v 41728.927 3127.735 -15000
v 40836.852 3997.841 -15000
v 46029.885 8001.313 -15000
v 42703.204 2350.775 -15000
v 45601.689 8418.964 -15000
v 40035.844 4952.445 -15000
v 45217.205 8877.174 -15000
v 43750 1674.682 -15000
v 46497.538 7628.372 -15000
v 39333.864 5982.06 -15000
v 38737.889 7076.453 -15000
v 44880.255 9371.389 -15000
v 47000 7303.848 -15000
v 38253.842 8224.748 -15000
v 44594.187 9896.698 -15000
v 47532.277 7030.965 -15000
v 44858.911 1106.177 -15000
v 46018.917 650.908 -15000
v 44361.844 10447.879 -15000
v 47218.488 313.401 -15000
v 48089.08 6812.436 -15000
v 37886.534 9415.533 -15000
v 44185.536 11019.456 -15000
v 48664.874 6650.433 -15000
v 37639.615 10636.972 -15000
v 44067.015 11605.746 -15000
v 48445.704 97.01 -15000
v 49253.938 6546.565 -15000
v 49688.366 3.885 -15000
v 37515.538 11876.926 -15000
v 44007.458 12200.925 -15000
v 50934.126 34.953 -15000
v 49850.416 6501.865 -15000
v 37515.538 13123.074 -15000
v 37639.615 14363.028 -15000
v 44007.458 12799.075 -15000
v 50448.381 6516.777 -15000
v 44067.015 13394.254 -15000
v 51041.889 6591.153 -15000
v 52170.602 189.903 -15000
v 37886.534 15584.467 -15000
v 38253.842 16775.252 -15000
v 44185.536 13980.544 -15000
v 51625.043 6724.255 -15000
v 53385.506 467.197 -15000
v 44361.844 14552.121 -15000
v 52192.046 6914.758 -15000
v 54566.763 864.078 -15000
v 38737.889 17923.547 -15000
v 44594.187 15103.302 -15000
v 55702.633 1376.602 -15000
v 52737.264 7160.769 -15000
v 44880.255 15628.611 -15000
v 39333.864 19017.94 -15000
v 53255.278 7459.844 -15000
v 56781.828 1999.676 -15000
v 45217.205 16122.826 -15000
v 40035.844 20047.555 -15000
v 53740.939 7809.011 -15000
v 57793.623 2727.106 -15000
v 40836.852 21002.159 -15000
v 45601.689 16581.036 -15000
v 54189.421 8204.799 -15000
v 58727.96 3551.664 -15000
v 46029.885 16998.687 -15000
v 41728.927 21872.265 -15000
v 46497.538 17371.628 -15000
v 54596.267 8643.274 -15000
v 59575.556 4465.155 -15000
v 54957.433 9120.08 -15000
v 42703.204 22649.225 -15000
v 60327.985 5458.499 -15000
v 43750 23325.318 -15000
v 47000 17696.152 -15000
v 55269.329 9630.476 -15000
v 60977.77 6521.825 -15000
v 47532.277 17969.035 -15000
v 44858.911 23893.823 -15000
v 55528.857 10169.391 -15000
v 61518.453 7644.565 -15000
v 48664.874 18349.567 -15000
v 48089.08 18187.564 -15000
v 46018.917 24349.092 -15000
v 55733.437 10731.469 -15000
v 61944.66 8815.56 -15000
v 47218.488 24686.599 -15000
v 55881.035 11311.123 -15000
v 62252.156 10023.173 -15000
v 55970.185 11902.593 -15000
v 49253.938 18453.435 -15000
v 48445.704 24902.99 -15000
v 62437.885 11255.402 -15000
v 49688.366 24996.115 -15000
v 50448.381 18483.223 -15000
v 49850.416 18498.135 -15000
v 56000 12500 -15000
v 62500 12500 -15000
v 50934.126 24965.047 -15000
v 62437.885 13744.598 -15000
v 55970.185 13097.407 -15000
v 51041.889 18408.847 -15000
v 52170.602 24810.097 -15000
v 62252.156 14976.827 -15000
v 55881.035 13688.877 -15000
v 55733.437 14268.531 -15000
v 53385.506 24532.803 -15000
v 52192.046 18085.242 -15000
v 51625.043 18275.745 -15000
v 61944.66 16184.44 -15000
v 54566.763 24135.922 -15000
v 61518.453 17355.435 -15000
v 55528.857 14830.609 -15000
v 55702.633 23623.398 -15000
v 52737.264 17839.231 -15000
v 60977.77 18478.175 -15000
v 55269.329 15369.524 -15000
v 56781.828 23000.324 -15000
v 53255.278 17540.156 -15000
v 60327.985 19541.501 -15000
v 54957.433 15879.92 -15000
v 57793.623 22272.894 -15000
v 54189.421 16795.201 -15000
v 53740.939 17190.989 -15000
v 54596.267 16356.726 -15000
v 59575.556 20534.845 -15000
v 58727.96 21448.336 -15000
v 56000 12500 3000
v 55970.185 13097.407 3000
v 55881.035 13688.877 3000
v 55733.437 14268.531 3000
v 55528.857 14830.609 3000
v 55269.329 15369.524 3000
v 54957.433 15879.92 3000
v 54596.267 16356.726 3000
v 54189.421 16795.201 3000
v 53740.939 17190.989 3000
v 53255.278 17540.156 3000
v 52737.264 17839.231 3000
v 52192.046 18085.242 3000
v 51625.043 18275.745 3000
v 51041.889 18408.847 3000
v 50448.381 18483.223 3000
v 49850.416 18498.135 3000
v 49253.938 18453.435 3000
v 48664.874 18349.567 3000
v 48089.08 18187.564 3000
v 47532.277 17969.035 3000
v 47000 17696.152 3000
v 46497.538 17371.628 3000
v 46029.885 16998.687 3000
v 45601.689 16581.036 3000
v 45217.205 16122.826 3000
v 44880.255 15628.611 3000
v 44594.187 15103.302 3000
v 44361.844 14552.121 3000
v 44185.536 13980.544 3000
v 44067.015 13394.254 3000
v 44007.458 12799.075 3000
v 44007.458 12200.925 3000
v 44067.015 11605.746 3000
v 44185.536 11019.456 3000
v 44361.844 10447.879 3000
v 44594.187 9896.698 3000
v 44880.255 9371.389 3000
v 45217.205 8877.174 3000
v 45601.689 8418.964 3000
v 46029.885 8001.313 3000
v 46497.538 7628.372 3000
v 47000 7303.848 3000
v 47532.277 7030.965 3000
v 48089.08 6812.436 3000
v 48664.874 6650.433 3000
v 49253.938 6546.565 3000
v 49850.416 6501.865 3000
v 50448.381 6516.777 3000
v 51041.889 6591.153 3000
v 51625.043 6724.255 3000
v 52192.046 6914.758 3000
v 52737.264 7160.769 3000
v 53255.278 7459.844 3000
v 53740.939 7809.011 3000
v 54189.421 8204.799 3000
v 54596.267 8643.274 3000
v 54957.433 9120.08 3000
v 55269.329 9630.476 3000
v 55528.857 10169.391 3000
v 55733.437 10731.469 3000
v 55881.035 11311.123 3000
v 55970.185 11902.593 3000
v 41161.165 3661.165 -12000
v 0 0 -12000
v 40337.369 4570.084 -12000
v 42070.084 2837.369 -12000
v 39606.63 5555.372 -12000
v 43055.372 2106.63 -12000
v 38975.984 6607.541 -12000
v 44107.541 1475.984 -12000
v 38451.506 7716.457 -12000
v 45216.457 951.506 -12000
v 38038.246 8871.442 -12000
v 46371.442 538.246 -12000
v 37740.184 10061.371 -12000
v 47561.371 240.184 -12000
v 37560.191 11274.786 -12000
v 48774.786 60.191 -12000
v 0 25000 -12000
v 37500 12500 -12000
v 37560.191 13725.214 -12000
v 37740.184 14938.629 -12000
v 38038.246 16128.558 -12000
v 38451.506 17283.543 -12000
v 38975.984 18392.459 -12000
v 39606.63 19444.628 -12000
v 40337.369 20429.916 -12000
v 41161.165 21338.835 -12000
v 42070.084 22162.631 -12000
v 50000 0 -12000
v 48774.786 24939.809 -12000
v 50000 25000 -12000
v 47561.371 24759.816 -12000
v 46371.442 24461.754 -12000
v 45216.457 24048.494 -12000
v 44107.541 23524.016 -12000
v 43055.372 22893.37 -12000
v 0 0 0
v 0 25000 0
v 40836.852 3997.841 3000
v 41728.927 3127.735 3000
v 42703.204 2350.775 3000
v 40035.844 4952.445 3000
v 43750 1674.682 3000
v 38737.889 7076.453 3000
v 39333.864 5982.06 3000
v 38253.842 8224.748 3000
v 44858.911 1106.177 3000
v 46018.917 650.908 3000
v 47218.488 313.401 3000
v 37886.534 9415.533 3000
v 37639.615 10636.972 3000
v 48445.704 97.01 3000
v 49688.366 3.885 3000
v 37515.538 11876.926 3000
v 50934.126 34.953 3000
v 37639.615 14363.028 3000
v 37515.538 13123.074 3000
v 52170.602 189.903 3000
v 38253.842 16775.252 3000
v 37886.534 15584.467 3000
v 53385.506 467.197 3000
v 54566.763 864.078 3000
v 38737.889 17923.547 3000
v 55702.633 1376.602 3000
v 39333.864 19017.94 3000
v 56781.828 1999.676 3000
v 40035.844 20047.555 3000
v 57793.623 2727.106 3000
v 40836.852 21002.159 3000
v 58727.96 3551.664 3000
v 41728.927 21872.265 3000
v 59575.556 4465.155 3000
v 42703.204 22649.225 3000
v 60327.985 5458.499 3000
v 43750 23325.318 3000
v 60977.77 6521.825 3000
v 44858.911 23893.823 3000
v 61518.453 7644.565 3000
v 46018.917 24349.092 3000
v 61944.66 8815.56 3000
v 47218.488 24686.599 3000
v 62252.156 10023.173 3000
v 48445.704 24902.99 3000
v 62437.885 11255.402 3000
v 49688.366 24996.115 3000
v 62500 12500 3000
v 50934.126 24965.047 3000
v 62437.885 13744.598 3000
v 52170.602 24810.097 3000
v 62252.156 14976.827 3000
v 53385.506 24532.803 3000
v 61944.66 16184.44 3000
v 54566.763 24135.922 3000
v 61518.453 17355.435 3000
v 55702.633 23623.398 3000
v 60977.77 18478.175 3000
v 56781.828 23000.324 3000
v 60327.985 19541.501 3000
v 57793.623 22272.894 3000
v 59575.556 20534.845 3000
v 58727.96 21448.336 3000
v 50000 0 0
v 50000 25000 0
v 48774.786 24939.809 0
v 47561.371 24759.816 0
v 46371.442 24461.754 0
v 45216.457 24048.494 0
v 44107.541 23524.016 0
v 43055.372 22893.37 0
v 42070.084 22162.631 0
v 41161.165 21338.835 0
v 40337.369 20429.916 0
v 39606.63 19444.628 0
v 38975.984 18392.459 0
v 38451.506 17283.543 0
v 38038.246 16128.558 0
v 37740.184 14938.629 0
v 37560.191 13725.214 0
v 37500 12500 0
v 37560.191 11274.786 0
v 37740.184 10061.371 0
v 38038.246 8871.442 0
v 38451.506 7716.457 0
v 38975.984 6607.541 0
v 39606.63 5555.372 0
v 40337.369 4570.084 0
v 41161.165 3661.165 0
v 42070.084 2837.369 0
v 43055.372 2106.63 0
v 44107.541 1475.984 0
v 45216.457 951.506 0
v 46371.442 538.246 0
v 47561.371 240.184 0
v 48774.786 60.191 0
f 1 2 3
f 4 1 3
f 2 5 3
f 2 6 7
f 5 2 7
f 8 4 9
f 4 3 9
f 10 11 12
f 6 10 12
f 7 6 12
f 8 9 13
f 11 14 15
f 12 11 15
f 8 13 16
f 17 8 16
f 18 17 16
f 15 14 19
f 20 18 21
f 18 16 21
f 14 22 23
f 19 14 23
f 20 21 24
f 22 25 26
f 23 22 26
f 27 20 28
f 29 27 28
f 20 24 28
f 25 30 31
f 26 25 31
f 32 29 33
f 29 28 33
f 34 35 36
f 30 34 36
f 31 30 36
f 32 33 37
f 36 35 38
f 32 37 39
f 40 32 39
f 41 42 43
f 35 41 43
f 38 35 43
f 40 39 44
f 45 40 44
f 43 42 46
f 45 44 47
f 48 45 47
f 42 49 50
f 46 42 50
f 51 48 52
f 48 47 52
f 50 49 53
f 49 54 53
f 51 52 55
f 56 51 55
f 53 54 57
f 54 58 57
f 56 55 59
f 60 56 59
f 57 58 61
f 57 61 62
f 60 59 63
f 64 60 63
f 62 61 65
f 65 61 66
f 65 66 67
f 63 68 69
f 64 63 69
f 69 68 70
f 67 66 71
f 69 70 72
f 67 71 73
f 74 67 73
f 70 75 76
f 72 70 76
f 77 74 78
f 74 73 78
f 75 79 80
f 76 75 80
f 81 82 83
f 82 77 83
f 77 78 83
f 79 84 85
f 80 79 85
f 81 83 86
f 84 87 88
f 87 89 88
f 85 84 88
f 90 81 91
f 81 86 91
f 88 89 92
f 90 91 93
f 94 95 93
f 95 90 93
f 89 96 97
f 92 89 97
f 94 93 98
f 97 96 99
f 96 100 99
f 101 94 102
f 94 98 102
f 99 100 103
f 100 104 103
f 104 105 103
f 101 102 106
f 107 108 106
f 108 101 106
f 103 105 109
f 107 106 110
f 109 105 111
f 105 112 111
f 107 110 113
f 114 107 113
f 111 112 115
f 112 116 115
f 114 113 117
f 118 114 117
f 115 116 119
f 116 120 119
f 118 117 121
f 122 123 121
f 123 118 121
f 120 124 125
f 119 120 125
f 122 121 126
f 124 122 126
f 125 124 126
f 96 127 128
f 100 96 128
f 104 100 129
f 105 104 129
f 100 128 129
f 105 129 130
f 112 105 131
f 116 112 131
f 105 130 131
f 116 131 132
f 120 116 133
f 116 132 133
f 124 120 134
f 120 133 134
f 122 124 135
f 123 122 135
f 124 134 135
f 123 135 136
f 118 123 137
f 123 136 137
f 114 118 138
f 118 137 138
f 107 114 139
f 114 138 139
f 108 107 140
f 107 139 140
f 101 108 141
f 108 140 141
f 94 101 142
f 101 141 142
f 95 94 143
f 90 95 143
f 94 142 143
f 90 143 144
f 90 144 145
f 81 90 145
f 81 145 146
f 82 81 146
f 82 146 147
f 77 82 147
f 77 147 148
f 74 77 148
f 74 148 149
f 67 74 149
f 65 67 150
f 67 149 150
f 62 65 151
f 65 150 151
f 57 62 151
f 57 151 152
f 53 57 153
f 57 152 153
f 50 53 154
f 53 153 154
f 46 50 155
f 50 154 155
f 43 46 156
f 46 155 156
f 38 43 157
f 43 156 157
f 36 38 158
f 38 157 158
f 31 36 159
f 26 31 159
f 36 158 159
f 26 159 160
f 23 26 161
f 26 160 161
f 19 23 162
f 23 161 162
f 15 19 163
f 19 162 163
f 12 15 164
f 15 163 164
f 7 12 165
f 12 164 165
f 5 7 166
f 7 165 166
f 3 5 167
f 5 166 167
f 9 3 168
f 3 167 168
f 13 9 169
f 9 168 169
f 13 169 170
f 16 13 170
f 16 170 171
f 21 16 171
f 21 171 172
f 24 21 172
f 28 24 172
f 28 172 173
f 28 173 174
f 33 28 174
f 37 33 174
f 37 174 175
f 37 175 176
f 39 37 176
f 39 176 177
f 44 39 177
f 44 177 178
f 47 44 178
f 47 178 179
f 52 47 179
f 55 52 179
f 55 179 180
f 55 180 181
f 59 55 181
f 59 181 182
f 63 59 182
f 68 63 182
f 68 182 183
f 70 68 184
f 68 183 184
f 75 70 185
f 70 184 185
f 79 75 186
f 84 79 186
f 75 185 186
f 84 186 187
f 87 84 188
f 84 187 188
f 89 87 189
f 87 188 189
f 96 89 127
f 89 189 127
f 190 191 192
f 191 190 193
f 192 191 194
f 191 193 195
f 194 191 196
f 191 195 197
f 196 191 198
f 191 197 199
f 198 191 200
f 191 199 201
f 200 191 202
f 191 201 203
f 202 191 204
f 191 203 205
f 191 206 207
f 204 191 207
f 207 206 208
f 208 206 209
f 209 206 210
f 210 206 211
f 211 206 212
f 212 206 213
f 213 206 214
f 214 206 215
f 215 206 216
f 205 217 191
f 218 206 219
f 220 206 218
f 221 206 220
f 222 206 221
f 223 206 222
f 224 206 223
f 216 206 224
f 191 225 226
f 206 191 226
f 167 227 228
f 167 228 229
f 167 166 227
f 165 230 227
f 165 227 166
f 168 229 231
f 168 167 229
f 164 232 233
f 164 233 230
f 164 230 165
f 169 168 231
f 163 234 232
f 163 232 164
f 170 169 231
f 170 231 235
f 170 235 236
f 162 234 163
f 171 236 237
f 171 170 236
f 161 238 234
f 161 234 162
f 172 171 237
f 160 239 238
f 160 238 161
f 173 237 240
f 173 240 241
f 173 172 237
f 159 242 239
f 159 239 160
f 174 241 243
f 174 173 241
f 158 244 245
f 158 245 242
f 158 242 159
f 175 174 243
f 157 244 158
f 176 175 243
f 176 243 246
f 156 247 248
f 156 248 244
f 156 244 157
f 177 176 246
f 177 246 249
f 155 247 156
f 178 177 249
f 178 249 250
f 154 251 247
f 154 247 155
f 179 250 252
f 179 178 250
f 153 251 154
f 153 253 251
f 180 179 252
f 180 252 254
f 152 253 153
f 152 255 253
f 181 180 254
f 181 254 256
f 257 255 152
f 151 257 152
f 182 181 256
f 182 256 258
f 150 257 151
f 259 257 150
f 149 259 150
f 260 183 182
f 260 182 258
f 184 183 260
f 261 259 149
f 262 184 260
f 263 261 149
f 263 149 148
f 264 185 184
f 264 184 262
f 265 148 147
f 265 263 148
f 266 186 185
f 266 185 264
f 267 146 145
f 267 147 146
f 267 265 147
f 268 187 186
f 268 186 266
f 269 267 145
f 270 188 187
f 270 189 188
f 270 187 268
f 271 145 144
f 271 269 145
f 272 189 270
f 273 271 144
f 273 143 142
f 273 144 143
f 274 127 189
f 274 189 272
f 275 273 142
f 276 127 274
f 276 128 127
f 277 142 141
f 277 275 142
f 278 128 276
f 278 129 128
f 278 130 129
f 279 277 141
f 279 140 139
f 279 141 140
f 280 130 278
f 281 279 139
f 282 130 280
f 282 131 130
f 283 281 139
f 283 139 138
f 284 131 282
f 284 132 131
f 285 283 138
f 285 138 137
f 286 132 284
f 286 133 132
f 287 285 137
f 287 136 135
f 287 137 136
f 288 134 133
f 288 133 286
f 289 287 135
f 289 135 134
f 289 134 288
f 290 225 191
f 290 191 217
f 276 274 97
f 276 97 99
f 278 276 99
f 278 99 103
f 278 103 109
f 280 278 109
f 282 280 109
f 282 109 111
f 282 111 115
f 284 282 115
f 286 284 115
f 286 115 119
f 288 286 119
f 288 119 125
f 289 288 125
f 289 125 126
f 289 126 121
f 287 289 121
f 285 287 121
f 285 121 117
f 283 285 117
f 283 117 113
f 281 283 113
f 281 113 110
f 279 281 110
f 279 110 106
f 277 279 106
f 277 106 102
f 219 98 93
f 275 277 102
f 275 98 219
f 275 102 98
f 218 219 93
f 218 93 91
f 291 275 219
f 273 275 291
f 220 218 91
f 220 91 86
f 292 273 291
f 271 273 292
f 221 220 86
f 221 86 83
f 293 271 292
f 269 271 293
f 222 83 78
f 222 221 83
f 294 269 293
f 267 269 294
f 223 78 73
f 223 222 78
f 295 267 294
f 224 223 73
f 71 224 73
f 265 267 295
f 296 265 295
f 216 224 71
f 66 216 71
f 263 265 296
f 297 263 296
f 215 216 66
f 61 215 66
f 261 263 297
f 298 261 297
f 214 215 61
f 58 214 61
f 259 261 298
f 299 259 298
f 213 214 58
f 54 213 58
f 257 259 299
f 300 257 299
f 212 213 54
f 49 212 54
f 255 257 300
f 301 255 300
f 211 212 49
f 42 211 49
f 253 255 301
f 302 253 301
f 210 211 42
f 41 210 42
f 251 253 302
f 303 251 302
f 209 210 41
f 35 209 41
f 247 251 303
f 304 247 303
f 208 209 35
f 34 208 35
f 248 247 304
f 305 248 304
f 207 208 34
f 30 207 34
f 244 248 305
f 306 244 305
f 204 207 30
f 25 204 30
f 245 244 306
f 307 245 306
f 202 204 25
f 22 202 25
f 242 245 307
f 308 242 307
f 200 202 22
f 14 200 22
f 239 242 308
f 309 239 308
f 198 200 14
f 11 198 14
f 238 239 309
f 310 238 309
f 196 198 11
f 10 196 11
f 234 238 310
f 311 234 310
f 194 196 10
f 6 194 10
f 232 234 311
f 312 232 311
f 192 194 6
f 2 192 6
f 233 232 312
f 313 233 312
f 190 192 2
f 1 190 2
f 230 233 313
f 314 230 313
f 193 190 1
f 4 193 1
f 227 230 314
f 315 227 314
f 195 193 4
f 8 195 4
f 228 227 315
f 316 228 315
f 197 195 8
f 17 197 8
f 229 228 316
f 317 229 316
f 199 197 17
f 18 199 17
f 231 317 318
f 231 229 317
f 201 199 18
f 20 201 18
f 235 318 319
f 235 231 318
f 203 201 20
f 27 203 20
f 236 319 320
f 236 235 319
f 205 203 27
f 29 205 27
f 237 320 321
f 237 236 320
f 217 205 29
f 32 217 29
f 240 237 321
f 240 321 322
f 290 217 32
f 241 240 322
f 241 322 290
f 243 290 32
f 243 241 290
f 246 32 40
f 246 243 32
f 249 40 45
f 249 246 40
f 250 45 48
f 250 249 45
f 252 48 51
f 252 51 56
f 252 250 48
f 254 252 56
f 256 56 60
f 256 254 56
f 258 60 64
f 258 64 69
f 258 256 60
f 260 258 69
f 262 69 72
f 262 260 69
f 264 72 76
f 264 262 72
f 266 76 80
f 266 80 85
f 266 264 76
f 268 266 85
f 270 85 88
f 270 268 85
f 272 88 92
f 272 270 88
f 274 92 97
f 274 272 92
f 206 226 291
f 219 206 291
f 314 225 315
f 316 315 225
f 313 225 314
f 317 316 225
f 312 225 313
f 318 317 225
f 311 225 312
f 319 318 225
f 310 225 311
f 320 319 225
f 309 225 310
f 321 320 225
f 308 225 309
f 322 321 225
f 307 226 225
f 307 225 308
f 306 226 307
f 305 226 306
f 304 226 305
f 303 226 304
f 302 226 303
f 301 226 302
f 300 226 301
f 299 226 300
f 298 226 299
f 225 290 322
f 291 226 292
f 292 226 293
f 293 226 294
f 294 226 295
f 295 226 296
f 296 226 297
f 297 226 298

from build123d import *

# Parameters (mm, degrees)
SKETCH1_W           = 50000
SKETCH1_H           = 25000
BOSS_EXTRUDE1_DEPTH = 12000
SKETCH2_R           = 12500
BOSS_EXTRUDE2_DEPTH = 15000
BOSS_EXTRUDE3_START = 3000
SKETCH3_R           = 12500
BOSS_EXTRUDE3_DEPTH = 3000
SKETCH4_R           = 6000
CUT_EXTRUDE1_DEPTH  = 18000


with BuildPart() as part:
    # Sketch1 → Boss-Extrude1 (new body)
    with BuildSketch(Plane.XY):
        with Locations((25000, 12500)):
            Rectangle(SKETCH1_W, SKETCH1_H)
    extrude(amount=-BOSS_EXTRUDE1_DEPTH)

    # Sketch2 → Boss-Extrude2 (add)
    with BuildSketch(Plane.XY):
        with Locations((50000, 12500)):
            Circle(SKETCH2_R)
    extrude(amount=-BOSS_EXTRUDE2_DEPTH)

    # Sketch3 → Boss-Extrude3 (add)
    with BuildSketch(Plane.XY.offset(BOSS_EXTRUDE3_START)):
        with Locations((50000, 12500)):
            Circle(SKETCH3_R)
    extrude(amount=-BOSS_EXTRUDE3_DEPTH)

    # Sketch4 → Cut-Extrude1 (cut)
    with BuildSketch(Plane.XY.offset(3000)):
        with Locations((50000, 12500)):
            Circle(SKETCH4_R)
    extrude(amount=-CUT_EXTRUDE1_DEPTH, mode=Mode.SUBTRACT)


solid = part.part
